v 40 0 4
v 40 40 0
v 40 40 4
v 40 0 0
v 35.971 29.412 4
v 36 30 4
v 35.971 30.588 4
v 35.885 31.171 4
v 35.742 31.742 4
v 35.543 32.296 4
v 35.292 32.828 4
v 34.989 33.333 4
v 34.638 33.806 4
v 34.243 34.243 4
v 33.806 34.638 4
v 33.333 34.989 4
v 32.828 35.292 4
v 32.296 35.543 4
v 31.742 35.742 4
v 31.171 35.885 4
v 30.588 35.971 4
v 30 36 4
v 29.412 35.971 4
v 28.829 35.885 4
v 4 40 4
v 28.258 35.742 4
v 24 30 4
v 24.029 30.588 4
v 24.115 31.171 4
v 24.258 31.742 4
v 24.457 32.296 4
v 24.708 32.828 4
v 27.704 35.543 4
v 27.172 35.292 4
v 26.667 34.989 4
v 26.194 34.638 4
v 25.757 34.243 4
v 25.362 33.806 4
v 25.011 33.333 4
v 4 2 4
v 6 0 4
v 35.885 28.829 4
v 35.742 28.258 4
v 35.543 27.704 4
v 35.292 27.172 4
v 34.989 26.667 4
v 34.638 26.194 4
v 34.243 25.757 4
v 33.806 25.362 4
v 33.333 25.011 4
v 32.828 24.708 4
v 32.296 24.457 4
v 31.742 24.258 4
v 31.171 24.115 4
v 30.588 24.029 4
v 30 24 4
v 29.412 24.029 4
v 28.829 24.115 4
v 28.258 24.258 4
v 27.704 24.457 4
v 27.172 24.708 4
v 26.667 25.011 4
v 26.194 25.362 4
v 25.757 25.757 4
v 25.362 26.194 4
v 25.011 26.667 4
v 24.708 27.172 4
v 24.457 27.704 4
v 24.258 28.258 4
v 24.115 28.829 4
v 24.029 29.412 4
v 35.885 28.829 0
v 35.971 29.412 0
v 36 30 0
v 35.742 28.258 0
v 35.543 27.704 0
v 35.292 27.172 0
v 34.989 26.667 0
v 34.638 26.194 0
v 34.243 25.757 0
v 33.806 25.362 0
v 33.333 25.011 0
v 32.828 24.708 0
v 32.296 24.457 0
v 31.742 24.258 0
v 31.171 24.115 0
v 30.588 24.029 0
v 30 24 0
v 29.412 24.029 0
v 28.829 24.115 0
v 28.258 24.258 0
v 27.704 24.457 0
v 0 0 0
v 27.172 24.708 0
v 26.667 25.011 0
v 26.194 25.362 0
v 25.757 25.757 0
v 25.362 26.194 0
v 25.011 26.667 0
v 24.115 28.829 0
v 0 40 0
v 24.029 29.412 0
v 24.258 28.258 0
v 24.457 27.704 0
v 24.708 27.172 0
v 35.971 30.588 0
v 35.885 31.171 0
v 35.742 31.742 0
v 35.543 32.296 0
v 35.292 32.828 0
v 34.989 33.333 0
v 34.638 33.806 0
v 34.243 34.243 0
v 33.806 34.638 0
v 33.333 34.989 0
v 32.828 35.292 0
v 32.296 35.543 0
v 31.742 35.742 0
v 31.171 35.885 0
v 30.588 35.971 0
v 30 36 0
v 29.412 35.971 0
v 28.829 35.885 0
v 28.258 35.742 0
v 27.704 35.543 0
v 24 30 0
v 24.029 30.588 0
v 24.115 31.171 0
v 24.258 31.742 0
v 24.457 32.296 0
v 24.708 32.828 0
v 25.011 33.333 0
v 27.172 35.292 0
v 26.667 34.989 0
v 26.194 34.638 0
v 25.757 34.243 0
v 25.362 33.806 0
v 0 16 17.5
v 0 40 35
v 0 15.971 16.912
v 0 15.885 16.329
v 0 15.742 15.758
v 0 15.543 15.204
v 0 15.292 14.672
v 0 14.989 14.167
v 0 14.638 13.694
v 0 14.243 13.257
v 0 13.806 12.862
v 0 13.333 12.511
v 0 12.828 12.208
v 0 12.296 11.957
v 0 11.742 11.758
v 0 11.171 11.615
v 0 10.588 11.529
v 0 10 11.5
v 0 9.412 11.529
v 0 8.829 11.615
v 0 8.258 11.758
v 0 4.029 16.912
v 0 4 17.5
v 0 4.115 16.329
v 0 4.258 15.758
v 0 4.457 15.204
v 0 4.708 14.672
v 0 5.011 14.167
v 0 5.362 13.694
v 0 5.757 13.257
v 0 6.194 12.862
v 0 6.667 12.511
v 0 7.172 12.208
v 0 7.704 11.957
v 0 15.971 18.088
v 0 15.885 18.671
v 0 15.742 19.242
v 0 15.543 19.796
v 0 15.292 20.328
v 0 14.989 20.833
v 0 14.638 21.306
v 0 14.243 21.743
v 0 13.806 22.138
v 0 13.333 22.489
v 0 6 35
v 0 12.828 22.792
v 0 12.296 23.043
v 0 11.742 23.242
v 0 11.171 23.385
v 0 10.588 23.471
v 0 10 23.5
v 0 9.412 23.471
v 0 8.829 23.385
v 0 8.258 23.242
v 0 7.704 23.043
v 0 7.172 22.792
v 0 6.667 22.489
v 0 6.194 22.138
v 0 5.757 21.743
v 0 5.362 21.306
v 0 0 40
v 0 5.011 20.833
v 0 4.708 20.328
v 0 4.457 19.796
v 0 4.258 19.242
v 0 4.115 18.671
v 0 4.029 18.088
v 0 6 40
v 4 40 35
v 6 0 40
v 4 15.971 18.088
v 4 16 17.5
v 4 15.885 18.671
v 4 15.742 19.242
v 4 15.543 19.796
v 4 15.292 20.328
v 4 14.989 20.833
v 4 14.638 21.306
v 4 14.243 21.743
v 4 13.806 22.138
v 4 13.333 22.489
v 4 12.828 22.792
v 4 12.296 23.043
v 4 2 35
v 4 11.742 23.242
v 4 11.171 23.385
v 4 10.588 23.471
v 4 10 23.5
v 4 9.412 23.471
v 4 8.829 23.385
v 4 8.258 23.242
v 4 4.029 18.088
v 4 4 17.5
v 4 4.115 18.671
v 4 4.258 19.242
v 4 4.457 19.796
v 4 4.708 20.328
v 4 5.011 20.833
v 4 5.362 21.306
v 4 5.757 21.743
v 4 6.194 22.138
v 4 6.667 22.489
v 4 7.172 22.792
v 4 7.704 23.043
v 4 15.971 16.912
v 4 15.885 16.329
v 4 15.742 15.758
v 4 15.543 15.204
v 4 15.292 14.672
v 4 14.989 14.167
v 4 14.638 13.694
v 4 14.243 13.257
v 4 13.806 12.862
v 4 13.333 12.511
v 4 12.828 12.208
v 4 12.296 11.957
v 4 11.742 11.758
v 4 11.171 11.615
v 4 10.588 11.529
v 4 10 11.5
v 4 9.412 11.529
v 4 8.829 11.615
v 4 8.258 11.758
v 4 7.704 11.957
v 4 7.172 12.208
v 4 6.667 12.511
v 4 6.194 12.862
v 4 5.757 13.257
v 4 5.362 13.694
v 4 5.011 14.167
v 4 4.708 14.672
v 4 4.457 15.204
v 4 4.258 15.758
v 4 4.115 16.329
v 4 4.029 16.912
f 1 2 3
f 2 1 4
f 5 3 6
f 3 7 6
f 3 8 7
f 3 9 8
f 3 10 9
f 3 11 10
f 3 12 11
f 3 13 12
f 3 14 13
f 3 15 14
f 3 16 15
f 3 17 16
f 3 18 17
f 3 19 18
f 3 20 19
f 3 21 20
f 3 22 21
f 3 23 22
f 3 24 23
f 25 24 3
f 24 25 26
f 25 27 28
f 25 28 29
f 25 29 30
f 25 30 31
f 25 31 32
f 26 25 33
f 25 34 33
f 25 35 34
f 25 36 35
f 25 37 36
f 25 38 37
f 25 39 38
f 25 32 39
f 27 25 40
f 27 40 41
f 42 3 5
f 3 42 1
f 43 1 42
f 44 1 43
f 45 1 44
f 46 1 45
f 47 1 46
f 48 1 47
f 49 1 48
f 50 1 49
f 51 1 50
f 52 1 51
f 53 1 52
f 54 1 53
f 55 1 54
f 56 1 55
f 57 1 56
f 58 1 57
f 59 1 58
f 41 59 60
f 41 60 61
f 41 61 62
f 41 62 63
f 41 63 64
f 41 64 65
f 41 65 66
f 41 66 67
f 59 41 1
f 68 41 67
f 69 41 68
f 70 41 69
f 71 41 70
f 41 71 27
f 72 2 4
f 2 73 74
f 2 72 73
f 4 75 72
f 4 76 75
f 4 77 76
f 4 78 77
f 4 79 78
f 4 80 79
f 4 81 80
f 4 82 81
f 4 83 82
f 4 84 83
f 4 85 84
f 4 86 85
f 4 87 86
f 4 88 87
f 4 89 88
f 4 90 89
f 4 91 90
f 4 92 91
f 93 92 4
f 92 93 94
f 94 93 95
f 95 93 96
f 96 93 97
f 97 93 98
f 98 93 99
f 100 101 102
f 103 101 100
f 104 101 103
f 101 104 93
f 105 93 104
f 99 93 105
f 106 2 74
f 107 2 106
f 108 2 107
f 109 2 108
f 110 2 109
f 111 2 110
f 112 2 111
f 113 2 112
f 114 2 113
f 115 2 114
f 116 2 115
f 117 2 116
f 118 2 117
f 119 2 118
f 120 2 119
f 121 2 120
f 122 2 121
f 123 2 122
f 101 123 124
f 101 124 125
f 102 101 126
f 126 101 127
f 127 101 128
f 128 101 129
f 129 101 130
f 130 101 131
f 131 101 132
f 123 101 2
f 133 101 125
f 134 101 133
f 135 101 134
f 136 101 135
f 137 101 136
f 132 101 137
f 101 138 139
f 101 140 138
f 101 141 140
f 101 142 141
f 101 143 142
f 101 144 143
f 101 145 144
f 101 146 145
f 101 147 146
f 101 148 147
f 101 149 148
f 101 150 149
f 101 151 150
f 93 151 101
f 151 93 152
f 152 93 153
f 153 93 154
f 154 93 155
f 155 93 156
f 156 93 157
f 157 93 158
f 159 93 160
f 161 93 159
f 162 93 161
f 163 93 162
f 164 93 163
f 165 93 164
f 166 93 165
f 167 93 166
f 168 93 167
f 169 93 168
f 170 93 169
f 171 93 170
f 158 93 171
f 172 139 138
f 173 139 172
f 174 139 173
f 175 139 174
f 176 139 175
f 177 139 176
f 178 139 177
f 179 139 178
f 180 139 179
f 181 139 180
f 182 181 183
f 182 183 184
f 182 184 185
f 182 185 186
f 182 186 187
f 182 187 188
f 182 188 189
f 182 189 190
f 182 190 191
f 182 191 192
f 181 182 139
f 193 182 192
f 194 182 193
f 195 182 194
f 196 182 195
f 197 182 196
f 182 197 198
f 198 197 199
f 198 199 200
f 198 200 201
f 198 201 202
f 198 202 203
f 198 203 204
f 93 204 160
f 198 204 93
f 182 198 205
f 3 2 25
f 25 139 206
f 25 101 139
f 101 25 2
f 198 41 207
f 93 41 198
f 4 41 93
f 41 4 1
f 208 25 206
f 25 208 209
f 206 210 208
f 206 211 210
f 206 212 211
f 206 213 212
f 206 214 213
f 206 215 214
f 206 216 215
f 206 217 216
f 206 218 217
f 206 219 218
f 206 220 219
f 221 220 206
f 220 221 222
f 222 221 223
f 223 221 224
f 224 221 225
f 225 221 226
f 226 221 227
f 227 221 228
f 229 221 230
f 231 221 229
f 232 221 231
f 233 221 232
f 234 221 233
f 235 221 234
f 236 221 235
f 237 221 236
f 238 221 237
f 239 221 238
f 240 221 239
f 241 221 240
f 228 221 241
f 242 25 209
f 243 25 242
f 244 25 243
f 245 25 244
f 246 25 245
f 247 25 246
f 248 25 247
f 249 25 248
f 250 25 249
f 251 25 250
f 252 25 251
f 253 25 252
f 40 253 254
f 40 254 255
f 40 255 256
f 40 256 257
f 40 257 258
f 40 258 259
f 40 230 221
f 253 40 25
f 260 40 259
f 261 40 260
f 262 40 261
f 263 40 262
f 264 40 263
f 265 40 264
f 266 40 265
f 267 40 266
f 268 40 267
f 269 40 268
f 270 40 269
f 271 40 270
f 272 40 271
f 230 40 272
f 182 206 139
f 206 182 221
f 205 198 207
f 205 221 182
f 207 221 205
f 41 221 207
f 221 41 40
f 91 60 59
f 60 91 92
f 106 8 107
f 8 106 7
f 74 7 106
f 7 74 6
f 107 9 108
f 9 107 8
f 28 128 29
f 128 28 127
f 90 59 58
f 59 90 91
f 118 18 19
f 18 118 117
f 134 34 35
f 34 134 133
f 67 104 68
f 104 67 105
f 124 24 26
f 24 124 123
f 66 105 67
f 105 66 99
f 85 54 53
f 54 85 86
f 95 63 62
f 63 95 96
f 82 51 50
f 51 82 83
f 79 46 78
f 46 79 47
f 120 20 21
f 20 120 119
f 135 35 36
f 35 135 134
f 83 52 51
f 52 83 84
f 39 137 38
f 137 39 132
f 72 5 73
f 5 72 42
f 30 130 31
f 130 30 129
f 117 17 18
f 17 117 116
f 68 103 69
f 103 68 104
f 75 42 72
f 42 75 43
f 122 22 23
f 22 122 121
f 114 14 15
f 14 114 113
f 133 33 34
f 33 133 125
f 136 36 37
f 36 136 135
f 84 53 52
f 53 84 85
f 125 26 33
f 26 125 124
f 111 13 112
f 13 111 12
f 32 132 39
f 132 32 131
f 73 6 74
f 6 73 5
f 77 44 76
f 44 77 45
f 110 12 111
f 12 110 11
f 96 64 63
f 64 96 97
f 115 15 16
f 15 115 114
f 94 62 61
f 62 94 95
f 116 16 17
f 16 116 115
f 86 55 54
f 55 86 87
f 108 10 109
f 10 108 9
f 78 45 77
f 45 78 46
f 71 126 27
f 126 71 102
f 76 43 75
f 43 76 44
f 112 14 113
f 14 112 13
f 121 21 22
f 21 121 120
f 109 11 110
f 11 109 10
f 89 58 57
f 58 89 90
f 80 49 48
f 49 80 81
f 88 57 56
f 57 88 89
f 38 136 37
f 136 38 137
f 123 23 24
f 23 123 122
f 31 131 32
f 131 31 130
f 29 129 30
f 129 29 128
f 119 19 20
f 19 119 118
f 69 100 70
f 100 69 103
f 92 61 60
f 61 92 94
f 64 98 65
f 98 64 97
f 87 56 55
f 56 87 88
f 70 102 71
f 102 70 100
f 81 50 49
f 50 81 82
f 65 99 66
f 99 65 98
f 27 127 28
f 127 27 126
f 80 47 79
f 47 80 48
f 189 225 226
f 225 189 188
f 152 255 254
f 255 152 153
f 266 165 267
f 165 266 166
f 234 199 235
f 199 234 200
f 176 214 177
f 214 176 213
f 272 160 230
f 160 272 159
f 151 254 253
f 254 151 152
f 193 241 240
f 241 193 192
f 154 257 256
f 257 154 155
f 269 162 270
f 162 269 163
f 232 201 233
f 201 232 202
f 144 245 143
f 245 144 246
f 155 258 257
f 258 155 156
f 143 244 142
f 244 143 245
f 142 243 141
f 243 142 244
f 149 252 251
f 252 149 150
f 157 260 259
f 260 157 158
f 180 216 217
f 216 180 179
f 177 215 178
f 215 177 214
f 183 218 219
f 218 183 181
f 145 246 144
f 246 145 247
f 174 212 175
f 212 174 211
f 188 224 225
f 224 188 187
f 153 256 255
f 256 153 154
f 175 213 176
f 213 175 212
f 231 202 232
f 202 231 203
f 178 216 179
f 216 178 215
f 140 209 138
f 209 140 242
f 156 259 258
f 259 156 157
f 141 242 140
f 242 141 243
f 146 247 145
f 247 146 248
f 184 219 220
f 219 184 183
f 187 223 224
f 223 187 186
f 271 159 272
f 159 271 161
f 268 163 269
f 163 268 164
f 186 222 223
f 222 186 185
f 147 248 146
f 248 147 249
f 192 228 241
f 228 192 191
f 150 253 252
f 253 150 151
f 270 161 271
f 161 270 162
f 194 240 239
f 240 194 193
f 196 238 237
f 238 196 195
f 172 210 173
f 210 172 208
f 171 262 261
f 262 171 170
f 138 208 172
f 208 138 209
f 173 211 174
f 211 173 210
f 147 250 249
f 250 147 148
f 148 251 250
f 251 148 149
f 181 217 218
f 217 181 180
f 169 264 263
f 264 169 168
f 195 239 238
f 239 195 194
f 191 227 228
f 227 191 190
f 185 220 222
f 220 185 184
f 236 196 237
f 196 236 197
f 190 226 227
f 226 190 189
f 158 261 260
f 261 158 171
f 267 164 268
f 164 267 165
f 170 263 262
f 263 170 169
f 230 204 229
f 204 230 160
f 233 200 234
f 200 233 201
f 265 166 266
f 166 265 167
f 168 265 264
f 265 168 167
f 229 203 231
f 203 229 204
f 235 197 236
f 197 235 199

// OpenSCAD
$fn = 64;

size = [40, 40, 35];   // overall bounding box [X,Y,Z]
wall = 4;              // bracket wall thickness
rib  = 6;              // corner rib thickness
hole_d = 6.5;          // clearance hole diameter
csk_d  = 12;           // counterbore diameter
csk_h  = 4;            // counterbore depth
edge   = 10;           // hole offset from outer edges

module extrusion_bracket(sz=[40,40,35]) {
    x = sz[0];
    y = sz[1];
    z = sz[2];

    eps = 0.2;

    // L-bracket (angle bracket) within overall [x,y,z]:
    // Two perpendicular plates of thickness 'wall' plus a corner rib.
    difference() {
        union() {
            // Base plate: X by Y, thickness wall (at Z=0..wall)
            cube([x, y, wall], center=false);

            // Upright plate: thickness wall in X, spans Y and Z (at X=0..wall)
            cube([wall, y, z], center=false);

            // Corner rib (gusset) connecting base to upright along Y
            // Triangle in XZ plane: (0,0)->(rib,0)->(0,rib), extruded along Y
            linear_extrude(height=y, center=false, convexity=10)
                polygon(points=[[0,0],[rib,0],[0,rib]]);
        }

        // Through-hole in base plate (vertical, along Z), with counterbore from top of base
        // Keep hole fully inside base plate area.
        hx = x - edge;
        hy = y - edge;

        translate([hx, hy, -eps])
            cylinder(d=hole_d, h=wall + 2*eps, center=false);

        translate([hx, hy, wall - csk_h])
            cylinder(d=csk_d, h=csk_h + eps, center=false);

        // Through-hole in upright plate (horizontal, along X), with counterbore from outside face (X=wall side)
        // Place it centered in Z and offset from Y edge.
        hy2 = edge;
        hz2 = z/2;

        translate([-eps, hy2, hz2])
            rotate([0, 90, 0])
                cylinder(d=hole_d, h=wall + 2*eps, center=false);

        translate([wall - csk_h, hy2, hz2])
            rotate([0, 90, 0])
                cylinder(d=csk_d, h=csk_h + eps, center=false);
    }
}

extrusion_bracket(size);
